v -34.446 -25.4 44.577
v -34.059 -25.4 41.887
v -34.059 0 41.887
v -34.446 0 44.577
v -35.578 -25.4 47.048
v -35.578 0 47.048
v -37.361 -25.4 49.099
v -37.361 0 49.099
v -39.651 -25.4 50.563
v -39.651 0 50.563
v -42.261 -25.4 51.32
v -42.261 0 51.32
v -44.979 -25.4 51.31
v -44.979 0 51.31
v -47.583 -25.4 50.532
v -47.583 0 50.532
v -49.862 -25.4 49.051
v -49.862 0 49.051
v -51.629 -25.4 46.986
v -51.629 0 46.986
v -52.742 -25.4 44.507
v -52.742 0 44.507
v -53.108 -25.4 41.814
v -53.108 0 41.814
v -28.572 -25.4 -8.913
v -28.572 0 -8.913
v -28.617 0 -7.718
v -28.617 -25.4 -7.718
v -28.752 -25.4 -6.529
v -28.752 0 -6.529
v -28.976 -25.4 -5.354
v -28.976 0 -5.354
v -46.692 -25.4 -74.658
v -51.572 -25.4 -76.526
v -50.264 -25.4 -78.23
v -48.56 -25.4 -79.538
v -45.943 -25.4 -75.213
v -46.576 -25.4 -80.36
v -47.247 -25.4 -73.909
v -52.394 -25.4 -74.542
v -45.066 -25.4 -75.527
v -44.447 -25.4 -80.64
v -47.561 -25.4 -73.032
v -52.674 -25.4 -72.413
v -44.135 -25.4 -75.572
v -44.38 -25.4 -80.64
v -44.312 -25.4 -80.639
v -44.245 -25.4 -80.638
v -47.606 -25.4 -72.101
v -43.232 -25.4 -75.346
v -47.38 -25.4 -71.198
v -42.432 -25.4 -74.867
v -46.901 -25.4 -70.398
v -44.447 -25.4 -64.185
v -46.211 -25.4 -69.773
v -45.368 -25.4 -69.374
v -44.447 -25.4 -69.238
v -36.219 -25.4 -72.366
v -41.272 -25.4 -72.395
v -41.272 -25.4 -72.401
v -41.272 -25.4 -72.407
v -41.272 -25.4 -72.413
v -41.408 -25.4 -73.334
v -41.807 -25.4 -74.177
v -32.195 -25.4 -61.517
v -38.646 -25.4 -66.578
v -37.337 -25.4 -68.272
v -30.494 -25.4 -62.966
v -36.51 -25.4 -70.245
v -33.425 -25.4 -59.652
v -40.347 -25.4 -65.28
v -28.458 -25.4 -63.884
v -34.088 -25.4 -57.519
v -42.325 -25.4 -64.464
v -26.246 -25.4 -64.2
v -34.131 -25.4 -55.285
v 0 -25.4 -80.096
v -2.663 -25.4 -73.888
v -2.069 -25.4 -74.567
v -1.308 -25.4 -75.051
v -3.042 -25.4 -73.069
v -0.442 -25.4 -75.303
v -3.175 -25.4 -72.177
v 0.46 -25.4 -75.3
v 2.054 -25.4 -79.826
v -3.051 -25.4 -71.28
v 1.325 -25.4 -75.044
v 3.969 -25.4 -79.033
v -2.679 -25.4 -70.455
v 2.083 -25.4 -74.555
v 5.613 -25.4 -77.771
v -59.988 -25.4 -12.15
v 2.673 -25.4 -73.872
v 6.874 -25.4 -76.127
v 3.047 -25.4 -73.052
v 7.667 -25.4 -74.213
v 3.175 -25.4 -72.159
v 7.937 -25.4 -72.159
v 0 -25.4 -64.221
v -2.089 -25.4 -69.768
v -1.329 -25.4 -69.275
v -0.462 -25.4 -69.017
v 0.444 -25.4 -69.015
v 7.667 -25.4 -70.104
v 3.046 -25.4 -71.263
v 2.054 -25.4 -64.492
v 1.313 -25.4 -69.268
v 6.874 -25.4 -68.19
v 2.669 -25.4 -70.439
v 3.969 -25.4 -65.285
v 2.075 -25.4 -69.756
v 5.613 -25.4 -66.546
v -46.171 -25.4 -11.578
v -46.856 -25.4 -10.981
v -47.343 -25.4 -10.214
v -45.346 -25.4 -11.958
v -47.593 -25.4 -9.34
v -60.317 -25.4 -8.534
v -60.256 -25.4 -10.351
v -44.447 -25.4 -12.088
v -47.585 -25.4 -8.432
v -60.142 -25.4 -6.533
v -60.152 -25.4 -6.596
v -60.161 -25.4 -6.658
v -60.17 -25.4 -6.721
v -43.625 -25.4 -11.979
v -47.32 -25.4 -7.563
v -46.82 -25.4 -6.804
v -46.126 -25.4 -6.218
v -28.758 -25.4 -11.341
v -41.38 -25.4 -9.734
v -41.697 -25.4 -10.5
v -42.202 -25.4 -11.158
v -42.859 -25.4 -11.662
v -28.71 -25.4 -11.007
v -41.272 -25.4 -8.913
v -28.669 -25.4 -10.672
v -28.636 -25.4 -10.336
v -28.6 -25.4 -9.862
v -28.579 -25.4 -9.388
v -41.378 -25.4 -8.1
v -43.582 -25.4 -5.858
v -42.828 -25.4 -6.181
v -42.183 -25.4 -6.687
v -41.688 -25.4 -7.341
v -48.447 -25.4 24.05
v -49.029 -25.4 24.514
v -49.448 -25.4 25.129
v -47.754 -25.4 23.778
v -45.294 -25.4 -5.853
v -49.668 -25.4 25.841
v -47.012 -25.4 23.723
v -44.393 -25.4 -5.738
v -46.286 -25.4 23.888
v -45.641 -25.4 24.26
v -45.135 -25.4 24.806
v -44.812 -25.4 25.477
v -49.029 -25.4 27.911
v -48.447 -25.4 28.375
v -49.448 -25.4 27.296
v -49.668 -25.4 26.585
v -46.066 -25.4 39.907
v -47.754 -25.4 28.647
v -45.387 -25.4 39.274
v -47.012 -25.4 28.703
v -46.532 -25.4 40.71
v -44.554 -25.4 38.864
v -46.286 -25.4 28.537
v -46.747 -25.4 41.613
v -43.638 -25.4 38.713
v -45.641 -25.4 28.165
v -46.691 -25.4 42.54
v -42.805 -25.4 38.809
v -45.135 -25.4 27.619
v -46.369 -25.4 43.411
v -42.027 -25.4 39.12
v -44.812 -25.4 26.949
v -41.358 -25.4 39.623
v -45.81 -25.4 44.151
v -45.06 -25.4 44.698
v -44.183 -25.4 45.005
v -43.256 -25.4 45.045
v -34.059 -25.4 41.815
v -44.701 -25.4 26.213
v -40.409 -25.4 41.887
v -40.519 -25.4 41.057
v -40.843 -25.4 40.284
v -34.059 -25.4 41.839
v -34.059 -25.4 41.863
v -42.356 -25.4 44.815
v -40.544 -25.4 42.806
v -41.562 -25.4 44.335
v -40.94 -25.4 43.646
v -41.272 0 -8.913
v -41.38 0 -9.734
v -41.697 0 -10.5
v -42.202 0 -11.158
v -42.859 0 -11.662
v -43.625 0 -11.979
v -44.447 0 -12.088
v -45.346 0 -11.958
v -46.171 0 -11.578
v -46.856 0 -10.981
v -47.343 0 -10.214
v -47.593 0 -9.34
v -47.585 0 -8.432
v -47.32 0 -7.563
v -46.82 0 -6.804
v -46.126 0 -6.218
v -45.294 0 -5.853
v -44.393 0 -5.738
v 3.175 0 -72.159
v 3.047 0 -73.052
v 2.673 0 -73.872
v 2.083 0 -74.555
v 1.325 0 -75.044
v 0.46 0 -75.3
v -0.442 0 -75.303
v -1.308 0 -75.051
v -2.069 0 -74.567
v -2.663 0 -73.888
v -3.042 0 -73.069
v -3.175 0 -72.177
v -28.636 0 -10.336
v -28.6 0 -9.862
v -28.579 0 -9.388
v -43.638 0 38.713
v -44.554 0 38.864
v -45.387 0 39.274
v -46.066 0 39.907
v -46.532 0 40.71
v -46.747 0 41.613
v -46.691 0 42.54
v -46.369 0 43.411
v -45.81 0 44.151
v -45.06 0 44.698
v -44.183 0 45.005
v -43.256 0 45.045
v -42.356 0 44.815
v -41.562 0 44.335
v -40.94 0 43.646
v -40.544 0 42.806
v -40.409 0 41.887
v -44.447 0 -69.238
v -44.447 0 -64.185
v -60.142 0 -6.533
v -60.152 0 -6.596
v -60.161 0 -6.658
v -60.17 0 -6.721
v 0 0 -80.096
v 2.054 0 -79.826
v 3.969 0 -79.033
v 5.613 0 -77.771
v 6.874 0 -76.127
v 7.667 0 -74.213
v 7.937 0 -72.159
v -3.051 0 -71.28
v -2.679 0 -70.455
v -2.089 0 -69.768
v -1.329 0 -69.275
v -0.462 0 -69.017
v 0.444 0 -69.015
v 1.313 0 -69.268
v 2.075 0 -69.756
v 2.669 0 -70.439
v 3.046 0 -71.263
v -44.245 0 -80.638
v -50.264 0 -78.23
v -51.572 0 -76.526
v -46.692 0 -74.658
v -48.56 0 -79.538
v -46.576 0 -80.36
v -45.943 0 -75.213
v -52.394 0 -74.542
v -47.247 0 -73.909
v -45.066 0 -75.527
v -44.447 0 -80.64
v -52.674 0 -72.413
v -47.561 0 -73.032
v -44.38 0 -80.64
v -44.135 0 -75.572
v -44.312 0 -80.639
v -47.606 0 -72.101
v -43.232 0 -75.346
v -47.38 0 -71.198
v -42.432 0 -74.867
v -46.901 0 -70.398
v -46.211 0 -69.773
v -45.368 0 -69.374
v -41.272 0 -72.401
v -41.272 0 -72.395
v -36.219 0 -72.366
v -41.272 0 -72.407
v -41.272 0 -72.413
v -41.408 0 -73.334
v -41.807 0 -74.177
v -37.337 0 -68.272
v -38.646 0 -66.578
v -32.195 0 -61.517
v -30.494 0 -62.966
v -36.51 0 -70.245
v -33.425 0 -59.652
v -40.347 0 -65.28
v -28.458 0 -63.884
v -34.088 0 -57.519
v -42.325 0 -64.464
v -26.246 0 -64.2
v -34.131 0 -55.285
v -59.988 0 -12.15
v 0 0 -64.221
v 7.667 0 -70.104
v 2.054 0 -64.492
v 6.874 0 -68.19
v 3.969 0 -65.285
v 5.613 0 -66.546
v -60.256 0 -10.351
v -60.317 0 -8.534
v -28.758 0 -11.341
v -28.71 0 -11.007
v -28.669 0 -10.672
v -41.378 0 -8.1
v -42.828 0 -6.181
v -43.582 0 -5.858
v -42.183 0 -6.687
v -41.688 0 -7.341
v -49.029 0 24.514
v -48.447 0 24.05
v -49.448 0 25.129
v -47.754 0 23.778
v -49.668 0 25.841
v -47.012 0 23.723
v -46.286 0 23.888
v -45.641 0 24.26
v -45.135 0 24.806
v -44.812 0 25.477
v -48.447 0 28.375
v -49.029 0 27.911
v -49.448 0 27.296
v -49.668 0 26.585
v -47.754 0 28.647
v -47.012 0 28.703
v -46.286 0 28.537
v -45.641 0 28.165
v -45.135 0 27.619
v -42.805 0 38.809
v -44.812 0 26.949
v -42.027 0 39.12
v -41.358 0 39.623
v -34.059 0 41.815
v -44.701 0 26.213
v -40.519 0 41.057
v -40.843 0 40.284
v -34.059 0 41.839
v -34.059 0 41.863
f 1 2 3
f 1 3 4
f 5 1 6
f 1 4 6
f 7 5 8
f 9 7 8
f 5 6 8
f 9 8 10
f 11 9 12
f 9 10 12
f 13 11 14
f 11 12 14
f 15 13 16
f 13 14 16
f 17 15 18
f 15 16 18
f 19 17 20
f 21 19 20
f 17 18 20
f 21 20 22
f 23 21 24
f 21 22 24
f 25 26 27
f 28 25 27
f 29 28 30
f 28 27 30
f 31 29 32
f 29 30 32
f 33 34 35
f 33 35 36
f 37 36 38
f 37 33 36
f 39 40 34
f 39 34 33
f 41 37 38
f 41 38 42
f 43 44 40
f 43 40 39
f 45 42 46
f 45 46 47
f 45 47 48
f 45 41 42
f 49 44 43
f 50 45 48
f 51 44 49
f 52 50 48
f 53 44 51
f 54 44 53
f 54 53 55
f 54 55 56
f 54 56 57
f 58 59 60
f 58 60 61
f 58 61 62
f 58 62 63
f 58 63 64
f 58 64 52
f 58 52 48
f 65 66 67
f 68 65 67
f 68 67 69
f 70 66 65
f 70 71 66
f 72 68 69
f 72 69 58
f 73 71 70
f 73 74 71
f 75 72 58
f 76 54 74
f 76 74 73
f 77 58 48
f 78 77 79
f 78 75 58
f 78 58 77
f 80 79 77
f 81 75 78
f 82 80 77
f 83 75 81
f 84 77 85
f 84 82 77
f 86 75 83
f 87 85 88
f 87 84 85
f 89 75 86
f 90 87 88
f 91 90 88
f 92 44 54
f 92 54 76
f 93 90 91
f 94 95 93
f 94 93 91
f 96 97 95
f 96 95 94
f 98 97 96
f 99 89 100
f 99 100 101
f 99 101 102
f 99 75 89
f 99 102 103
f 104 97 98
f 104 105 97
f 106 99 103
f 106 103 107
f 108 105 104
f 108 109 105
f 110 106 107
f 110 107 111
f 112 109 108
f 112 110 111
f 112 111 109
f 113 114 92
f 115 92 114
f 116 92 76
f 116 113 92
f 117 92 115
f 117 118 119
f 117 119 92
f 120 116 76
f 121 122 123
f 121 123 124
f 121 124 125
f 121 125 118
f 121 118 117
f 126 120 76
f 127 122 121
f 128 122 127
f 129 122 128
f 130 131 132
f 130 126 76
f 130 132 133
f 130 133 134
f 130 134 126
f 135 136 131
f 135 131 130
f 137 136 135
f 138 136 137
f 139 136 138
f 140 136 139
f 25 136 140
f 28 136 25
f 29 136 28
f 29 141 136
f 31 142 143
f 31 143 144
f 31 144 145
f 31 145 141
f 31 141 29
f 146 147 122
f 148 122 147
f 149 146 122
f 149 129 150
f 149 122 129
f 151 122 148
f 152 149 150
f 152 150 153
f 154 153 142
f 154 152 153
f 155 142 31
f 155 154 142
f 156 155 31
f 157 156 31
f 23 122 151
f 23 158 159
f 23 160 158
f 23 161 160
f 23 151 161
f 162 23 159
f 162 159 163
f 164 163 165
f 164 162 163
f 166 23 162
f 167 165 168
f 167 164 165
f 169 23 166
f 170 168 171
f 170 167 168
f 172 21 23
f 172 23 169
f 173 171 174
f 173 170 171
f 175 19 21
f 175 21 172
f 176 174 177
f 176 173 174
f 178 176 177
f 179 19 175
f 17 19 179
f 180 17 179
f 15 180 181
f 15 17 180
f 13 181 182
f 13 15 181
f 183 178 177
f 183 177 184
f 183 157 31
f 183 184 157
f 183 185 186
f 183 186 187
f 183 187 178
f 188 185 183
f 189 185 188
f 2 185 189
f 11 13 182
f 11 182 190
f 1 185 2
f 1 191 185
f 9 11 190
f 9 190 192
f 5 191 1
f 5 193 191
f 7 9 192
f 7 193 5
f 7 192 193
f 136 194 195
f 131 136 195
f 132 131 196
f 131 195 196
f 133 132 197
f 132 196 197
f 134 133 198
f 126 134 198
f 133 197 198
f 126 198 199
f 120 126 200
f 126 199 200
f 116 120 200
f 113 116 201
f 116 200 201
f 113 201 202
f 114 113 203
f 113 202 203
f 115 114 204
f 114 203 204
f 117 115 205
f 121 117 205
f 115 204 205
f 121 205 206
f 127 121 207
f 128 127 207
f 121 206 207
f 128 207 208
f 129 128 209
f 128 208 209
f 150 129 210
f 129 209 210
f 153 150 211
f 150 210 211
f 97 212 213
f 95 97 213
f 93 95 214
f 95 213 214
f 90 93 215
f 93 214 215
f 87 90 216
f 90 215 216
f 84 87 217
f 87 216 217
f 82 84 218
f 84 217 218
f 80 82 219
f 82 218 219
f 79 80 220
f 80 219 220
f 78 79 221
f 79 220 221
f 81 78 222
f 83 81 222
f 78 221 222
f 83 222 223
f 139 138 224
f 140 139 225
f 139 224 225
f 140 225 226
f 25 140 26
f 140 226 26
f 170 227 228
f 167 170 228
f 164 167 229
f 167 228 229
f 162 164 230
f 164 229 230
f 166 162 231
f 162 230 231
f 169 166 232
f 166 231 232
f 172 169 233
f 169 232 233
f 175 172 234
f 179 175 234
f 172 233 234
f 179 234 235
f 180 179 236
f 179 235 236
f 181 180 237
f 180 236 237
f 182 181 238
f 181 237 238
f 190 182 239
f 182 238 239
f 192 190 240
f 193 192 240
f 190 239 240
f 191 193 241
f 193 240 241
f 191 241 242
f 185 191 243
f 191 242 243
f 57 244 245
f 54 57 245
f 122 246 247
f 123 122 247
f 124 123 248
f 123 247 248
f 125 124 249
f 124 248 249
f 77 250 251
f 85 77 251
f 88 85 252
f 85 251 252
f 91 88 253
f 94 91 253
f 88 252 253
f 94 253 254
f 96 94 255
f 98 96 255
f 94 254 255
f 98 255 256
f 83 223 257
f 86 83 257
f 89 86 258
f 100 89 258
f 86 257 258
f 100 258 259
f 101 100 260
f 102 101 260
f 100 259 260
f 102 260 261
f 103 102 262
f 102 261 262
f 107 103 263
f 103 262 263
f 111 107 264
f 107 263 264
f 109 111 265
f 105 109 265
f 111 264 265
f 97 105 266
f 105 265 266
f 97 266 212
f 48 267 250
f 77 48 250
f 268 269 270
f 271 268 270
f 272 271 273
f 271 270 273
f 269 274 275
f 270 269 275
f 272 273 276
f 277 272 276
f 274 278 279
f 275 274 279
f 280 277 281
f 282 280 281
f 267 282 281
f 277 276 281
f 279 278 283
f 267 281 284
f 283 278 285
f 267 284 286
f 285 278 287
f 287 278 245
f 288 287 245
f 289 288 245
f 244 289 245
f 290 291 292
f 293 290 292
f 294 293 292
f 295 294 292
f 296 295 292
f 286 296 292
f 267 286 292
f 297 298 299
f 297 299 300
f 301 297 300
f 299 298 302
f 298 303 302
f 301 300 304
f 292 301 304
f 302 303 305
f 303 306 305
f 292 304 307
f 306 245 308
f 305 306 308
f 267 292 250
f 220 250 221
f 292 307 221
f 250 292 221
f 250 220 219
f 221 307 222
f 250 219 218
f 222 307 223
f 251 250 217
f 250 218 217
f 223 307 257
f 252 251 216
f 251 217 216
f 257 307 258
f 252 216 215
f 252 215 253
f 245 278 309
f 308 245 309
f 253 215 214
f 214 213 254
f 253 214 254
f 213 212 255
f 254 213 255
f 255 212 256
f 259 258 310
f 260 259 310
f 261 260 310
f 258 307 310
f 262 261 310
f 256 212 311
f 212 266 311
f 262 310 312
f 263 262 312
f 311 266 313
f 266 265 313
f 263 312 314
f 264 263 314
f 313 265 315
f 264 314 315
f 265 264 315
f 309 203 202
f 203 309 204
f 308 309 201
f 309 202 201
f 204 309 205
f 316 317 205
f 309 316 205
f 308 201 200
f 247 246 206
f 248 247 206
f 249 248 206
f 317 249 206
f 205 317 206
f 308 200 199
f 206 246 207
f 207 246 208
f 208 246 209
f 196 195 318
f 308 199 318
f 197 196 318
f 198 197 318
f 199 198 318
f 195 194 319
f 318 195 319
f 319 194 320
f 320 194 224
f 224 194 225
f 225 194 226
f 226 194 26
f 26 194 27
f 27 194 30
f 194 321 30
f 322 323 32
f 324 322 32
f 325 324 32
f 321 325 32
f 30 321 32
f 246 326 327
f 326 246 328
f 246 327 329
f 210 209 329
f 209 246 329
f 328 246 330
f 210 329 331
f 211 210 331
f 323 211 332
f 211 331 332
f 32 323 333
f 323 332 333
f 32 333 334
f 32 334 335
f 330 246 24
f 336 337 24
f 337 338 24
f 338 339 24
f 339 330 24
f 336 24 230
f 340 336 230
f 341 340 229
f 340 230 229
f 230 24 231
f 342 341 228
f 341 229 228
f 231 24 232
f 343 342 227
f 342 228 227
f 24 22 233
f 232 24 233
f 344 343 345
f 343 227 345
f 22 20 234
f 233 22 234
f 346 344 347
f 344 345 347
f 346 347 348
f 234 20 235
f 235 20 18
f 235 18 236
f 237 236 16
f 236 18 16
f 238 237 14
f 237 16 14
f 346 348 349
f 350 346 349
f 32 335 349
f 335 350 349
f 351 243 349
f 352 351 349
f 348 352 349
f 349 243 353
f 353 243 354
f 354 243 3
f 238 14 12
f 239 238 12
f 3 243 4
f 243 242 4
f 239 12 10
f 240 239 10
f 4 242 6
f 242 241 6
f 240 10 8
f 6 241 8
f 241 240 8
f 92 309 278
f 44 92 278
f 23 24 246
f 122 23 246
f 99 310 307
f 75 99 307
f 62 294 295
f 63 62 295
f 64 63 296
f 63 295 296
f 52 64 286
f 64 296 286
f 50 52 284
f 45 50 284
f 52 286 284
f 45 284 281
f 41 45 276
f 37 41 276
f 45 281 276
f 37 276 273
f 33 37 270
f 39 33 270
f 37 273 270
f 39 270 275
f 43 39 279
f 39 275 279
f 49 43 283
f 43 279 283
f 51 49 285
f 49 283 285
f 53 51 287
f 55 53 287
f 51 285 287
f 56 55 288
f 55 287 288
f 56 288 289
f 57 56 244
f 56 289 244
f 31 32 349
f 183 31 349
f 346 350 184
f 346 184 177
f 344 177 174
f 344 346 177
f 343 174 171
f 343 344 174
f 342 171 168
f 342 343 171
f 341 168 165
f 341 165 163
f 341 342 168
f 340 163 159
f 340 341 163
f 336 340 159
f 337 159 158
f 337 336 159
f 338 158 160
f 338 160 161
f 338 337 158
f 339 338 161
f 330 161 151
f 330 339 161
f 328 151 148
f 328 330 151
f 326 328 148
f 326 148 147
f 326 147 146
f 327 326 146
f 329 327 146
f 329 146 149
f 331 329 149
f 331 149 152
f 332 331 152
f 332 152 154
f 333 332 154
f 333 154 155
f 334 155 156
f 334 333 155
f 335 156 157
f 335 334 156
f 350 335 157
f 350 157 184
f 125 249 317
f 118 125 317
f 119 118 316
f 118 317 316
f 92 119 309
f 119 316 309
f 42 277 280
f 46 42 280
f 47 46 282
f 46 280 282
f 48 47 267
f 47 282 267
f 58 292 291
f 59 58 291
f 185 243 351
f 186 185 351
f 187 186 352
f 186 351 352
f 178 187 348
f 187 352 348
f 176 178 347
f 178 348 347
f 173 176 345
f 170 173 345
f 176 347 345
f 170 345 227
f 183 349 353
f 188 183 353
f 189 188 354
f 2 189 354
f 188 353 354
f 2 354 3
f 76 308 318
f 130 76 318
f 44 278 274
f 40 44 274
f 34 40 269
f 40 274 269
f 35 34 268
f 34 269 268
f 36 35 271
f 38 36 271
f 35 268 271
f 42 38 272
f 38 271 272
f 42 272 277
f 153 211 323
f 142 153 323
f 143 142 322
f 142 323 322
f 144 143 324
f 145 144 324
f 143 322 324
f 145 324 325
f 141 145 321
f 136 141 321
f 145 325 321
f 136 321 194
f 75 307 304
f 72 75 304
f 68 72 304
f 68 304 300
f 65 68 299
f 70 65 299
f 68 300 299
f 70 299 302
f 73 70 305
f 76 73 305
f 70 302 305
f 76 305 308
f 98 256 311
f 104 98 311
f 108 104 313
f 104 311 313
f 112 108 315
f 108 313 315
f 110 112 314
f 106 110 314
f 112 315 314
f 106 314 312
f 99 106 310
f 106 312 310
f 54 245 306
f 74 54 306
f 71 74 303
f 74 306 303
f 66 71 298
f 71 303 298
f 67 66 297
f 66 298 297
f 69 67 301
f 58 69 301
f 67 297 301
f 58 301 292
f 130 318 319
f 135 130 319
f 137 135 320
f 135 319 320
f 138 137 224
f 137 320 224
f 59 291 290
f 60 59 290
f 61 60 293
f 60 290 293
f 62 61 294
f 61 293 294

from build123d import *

# Parameters (mm, degrees)
F0_R     = 2.4970860884
F1_DEPTH = 25.4


with BuildPart() as f1:
    # F0 (on Front) → F1 (new body)
    with BuildSketch(Plane.XZ):
        with BuildLine():
            ThreePointArc((-34.058996731, 41.8151793819), (-34.0587916512, 41.8512656744), (-34.058723291, 41.8873524848))
            ThreePointArc((-34.058723291, 41.8873524848), (-43.6204916456, 51.412281518), (-53.108439425, 41.8138163235))
            ThreePointArc((-53.108439425, 41.8138163235), (-50.3500442403, 35.1834337942), (-43.7455028396, 32.3637264748))
            ThreePointArc((-43.7455028396, 32.3637264748), (-36.931754808, 35.0699526651), (-34.058996731, 41.8151793819))
        make_face()
        with BuildLine():
            ThreePointArc((-40.408723291, 41.8873524848), (-41.3578068156, 39.6233028289), (-43.6376498072, 38.7128104815))
            ThreePointArc((-43.6376498072, 38.7128104815), (-45.8096397664, 44.1514021407), (-40.408723291, 41.8873524848))
        make_face(mode=Mode.SUBTRACT)
        with BuildLine():
            ThreePointArc((-43.7455028396, 32.3637264748), (-50.3500442403, 35.1834337942), (-53.108439425, 41.8138163235))
            Line((-53.108439425, 41.8138163235), (-60.1423228458, -6.5331159404))
            ThreePointArc((-60.1423228458, -6.5331159404), (-54.6939631735, 3.2120648216), (-44.1770394505, 6.9600625014))
            Line((-44.1770394505, 6.9600625014), (-43.7455028396, 32.3637264748))
        make_face()
        with Locations((-47.1983999014, 26.2127500027)):
            Circle(F0_R, mode=Mode.SUBTRACT)
        with BuildLine():
            Line((-28.9755803483, -5.3544250476), (-34.058996731, 41.8151793819))
            ThreePointArc((-34.058996731, 41.8151793819), (-36.931754808, 35.0699526651), (-43.7455028396, 32.3637264748))
            Line((-43.7455028396, 32.3637264748), (-44.1770394505, 6.9600625014))
            ThreePointArc((-44.1770394505, 6.9600625014), (-34.4539621393, 3.4227233349), (-28.9755803483, -5.3544250476))
        make_face()
        with BuildLine():
            Line((-60.1696796465, -6.7211510996), (-60.1423228458, -6.5331159404))
            ThreePointArc((-60.1423228458, -6.5331159404), (-60.156282583, -6.6270925889), (-60.1696796465, -6.7211510996))
        make_face()
        with BuildLine():
            ThreePointArc((-44.1770394505, 6.9600625014), (-54.6939631735, 3.2120648216), (-60.1423228458, -6.5331159404))
            Line((-60.1423228458, -6.5331159404), (-60.1696796465, -6.7211510996))
            ThreePointArc((-60.1696796465, -6.7211510996), (-60.3127983863, -9.4433635349), (-59.9880891038, -12.149927297))
            ThreePointArc((-59.9880891038, -12.149927297), (-54.4622551015, -21.2294539506), (-44.4466720315, -24.7876475152))
            Line((-44.4466720315, -24.7876475152), (-44.4466720315, -12.0876475152))
            ThreePointArc((-44.4466720315, -12.0876475152), (-47.6215575303, -8.8856832847), (-44.3927455153, -5.7381055119))
            Line((-44.3927455153, -5.7381055119), (-44.1770394505, 6.9600625014))
        make_face()
        with BuildLine():
            ThreePointArc((-28.5716720315, -8.9126475152), (-28.6729723153, -7.1221106504), (-28.9755803483, -5.3544250476))
            ThreePointArc((-28.9755803483, -5.3544250476), (-34.4539621393, 3.4227233349), (-44.1770394505, 6.9600625014))
            Line((-44.1770394505, 6.9600625014), (-44.3927455153, -5.7381055119))
            ThreePointArc((-44.3927455153, -5.7381055119), (-42.1826223756, -6.6867310398), (-41.2716720315, -8.9126475152))
            ThreePointArc((-41.2716720315, -8.9126475152), (-42.2016080012, -11.1577115455), (-44.4466720315, -12.0876475152))
            Line((-44.4466720315, -12.0876475152), (-44.4466720315, -24.7876475152))
            ThreePointArc((-44.4466720315, -24.7876475152), (-34.115422457, -20.9659004882), (-28.7584623121, -11.3407539379))
            Line((-28.7584623121, -11.3407539379), (-28.6355797608, -10.3356676158))
            ThreePointArc((-28.6355797608, -10.3356676158), (-28.5876570117, -9.6248747269), (-28.5716720315, -8.9126475152))
        make_face()
        with BuildLine():
            ThreePointArc((-44.4466720315, -24.7876475152), (-54.4622551015, -21.2294539506), (-59.9880891038, -12.149927297))
            Line((-59.9880891038, -12.149927297), (-52.6740726434, -72.4126475152))
            ThreePointArc((-52.6740726434, -72.4126475152), (-50.2643227957, -66.594996751), (-44.4466720315, -64.1852469033))
            Line((-44.4466720315, -64.1852469033), (-44.4466720315, -24.7876475152))
        make_face()
        with BuildLine():
            ThreePointArc((-28.7584623121, -11.3407539379), (-28.68900545, -10.839190768), (-28.6355797608, -10.3356676158))
            Line((-28.6355797608, -10.3356676158), (-28.7584623121, -11.3407539379))
        make_face()
        with BuildLine():
            ThreePointArc((-28.7584623121, -11.3407539379), (-34.115422457, -20.9659004882), (-44.4466720315, -24.7876475152))
            Line((-44.4466720315, -24.7876475152), (-44.4466720315, -64.1852469033))
            ThreePointArc((-44.4466720315, -64.1852469033), (-38.6456689688, -66.5783965525), (-36.2194057783, -72.3656280761))
            Line((-36.2194057783, -72.3656280761), (-7.9373703756, -72.2039941384))
            ThreePointArc((-7.9373703756, -72.2039941384), (-5.6286753497, -66.5620325034), (0, -64.2211314758))
            Line((0, -64.2211314758), (-26.2460871779, -64.1999413714))
            ThreePointArc((-26.2460871779, -64.1999413714), (-32.1947833248, -61.5168387322), (-34.1311079114, -55.2849311015))
            Line((-34.1311079114, -55.2849311015), (-28.7584623121, -11.3407539379))
        make_face()
        with BuildLine():
            ThreePointArc((-44.4466720315, -64.1852469033), (-50.2643227957, -66.594996751), (-52.6740726434, -72.4126475152))
            ThreePointArc((-52.6740726434, -72.4126475152), (-50.2643227957, -78.2302982795), (-44.4466720315, -80.6400481271))
            Line((-44.4466720315, -80.6400481271), (-44.2453363669, -80.6375842797))
            ThreePointArc((-44.2453363669, -80.6375842797), (-38.5582685977, -78.1586744756), (-36.2192714196, -72.4126475152))
            ThreePointArc((-36.2192714196, -72.4126475152), (-36.2193050093, -72.3891376997), (-36.2194057783, -72.3656280761))
            Line((-36.2194057783, -72.3656280761), (-41.2717238813, -72.3945024502))
            ThreePointArc((-41.2717238813, -72.3945024502), (-41.271684994, -72.4035749457), (-41.2716720315, -72.4126475152))
            ThreePointArc((-41.2716720315, -72.4126475152), (-46.6917360618, -74.6577115455), (-44.4466720315, -69.2376475152))
            Line((-44.4466720315, -69.2376475152), (-44.4466720315, -64.1852469033))
        make_face()
        with BuildLine():
            Line((-44.2453363669, -80.6375842797), (-44.4466720315, -80.6400481271))
            ThreePointArc((-44.4466720315, -80.6400481271), (-44.3459966616, -80.6394321422), (-44.2453363669, -80.6375842797))
        make_face()
        with BuildLine():
            Line((-7.9373703756, -72.2039941384), (-36.2194057783, -72.3656280761))
            ThreePointArc((-36.2194057783, -72.3656280761), (-36.2193050093, -72.3891376997), (-36.2192714196, -72.4126475152))
            ThreePointArc((-36.2192714196, -72.4126475152), (-38.5582685977, -78.1586744756), (-44.2453363669, -80.6375842797))
            Line((-44.2453363669, -80.6375842797), (0, -80.0961314758))
            ThreePointArc((0, -80.0961314758), (-5.5965989724, -77.7873068255), (-7.9373703756, -72.2039941384))
        make_face()
        with BuildLine():
            ThreePointArc((0, -64.2211314758), (-5.6286753497, -66.5620325034), (-7.9373703756, -72.2039941384))
            ThreePointArc((-7.9373703756, -72.2039941384), (-5.5965989724, -77.7873068255), (0, -80.0961314758))
            ThreePointArc((0, -80.0961314758), (5.6126600757, -77.7712915515), (7.9375, -72.1586314758))
            ThreePointArc((7.9375, -72.1586314758), (5.6126600757, -66.5459714001), (0, -64.2211314758))
        make_face()
        with BuildLine():
            ThreePointArc((3.175, -72.1586314758), (0.0090725696, -75.3336185133), (-3.1749481502, -72.1767765408))
            ThreePointArc((-3.1749481502, -72.1767765408), (-0.0090725696, -68.9836444383), (3.175, -72.1586314758))
        make_face(mode=Mode.SUBTRACT)
    extrude(amount=F1_DEPTH)


solid = f1.part
